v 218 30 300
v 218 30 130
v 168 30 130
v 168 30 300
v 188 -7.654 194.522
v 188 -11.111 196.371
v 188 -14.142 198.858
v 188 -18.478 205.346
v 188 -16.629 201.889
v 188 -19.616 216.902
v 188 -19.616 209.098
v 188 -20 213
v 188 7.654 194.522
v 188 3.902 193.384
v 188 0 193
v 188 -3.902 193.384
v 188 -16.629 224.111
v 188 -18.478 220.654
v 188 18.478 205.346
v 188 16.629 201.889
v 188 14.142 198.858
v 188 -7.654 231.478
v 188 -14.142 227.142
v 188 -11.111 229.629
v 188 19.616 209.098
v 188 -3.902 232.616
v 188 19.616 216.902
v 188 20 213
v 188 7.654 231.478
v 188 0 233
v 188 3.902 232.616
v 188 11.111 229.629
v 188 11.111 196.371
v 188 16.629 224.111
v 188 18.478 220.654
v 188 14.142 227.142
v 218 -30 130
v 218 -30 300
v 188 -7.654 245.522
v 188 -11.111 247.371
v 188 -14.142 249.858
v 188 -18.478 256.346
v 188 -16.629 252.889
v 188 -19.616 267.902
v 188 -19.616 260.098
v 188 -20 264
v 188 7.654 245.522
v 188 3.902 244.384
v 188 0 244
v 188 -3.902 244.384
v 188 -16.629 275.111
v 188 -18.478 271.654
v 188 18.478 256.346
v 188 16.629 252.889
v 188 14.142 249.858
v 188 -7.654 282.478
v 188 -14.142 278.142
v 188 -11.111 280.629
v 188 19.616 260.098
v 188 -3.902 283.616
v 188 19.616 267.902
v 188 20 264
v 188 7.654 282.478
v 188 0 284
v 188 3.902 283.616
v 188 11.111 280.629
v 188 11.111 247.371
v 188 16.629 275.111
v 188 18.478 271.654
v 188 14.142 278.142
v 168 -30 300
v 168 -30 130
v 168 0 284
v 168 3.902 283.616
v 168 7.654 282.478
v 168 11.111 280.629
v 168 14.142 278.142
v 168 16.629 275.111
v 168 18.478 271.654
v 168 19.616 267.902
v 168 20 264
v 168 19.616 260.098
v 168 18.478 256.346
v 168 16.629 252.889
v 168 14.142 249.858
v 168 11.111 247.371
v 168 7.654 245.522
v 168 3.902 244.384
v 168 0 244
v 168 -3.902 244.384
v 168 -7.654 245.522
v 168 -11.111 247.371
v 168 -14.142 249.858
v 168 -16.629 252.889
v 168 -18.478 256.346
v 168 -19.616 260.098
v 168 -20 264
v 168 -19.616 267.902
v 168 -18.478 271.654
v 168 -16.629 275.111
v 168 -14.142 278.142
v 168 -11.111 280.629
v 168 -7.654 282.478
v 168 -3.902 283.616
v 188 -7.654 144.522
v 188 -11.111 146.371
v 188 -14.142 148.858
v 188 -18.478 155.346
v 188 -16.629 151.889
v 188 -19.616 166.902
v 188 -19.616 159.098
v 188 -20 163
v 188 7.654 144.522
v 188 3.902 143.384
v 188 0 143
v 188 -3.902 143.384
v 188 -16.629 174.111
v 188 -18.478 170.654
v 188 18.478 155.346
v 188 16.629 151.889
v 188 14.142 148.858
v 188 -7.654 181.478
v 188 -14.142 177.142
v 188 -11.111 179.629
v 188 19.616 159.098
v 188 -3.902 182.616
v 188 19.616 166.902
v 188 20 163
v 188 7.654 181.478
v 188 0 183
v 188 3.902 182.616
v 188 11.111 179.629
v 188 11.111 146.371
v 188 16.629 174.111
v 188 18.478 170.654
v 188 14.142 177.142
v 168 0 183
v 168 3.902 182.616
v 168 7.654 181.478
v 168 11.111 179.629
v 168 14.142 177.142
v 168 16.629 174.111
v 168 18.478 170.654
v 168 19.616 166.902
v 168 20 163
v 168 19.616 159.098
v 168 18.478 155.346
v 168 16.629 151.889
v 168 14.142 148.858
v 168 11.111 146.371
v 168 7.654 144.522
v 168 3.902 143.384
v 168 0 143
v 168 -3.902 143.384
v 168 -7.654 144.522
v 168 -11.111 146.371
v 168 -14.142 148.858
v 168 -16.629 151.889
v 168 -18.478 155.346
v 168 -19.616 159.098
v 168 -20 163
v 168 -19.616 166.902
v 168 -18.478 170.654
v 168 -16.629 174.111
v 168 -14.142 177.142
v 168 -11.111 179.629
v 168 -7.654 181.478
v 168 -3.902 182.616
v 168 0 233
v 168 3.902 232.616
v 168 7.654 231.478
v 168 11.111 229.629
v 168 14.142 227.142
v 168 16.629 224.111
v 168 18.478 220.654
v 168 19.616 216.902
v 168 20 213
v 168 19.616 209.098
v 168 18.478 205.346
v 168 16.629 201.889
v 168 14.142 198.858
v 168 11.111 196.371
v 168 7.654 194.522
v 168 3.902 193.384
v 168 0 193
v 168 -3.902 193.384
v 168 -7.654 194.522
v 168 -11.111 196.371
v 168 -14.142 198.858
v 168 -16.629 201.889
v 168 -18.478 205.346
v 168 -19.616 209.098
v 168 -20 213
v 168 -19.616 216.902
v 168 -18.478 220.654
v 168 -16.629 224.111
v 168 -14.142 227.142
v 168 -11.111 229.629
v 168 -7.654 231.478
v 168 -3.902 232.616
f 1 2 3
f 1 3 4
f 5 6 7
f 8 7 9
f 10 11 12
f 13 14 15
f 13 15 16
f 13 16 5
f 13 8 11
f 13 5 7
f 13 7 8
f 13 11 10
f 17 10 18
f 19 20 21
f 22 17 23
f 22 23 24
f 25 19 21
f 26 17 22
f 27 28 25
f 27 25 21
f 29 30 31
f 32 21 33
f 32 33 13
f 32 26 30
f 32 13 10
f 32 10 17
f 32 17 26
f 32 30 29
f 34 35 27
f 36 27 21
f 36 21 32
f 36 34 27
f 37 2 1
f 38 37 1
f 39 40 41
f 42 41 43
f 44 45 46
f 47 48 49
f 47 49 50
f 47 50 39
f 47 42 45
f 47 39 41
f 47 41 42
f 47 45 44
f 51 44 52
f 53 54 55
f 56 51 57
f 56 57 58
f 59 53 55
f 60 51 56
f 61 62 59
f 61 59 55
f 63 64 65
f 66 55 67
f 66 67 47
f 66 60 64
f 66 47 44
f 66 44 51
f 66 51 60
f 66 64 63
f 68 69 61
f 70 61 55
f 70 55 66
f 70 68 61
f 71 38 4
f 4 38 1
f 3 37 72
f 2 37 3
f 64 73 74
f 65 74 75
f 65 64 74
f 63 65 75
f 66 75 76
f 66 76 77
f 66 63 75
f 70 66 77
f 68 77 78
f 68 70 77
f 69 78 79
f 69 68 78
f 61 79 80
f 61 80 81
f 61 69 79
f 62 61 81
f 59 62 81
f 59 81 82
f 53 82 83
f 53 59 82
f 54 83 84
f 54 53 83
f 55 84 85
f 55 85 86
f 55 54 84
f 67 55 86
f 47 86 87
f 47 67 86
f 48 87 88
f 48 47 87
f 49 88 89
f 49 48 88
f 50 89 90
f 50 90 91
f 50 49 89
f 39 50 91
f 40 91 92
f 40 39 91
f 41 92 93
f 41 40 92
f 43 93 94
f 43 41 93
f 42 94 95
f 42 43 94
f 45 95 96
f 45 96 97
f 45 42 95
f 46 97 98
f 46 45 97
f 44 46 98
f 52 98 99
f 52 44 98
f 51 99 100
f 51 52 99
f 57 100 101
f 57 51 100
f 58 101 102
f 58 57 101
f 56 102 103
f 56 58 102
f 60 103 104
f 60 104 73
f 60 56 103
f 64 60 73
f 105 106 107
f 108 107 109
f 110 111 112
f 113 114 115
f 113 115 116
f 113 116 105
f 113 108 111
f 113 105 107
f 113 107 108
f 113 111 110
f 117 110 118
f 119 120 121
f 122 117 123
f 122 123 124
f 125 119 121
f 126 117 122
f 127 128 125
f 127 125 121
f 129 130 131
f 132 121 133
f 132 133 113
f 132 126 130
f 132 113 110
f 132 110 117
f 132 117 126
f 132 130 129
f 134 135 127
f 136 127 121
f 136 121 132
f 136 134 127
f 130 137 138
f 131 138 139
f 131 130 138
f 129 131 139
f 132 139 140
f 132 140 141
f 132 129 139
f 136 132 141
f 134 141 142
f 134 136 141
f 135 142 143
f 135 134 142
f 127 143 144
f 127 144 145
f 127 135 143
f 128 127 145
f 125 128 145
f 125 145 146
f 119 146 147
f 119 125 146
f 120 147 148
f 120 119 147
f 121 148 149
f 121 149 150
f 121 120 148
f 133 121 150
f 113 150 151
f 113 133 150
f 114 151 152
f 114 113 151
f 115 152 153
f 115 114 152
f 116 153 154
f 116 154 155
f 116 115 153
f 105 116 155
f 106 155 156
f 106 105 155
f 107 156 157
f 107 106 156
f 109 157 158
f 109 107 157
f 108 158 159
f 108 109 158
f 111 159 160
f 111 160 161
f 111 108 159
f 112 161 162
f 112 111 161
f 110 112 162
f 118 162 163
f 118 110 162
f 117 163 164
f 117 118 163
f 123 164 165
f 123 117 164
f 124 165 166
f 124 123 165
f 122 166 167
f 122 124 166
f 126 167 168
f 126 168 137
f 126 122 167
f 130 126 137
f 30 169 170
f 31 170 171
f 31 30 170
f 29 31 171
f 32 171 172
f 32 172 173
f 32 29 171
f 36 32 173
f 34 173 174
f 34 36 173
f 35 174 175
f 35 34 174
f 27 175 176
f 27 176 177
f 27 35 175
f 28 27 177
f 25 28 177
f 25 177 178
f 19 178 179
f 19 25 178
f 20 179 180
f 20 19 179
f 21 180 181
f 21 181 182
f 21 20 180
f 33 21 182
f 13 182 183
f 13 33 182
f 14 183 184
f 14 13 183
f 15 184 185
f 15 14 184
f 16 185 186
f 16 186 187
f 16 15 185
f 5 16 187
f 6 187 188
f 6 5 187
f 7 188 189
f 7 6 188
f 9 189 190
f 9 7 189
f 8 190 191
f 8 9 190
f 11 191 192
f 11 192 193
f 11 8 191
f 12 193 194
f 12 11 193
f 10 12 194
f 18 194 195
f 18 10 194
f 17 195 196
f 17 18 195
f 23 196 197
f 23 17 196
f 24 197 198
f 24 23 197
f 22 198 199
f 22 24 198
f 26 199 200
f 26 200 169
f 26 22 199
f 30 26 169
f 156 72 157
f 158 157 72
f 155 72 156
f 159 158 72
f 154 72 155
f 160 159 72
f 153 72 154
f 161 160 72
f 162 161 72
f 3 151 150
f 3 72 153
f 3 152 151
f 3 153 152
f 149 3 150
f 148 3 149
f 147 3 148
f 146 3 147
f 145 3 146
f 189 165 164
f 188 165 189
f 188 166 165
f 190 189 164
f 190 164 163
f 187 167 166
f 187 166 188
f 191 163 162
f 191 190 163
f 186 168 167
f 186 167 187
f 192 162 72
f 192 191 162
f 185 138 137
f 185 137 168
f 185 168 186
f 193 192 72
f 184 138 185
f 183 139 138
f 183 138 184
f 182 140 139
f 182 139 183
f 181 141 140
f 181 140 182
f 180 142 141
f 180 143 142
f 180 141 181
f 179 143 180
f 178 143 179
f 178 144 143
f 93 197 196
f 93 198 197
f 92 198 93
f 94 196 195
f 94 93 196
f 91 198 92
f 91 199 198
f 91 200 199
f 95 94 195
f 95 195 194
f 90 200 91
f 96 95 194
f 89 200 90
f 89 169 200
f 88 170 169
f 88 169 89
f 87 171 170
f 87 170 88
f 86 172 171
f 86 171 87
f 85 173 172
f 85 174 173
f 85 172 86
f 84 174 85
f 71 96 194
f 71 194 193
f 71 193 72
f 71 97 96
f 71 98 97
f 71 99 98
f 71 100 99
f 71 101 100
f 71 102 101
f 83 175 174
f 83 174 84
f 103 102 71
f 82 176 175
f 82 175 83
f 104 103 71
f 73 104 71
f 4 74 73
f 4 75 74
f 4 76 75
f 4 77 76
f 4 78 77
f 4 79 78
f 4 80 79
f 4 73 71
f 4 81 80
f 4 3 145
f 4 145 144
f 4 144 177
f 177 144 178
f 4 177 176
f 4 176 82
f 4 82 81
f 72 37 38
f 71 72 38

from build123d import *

# Parameters (mm, degrees)
CYLINDER004_R          = 20
CYLINDER004_DEPTH      = 20
CYLINDER005_R          = 20
CYLINDER005_DEPTH      = 20
CYLINDER003_R          = 20
CYLINDER003_DEPTH      = 20
BOX009_W               = 170
BOX009_H               = 60
BOX009_DEPTH           = 50
CUT006_PLACEMENT_ANGLE = 90


with BuildPart() as cylinder003:
    # Cylinder004 → Cylinder004 (new body)
    with BuildSketch(Plane(origin=(83, 579, 175), x_dir=(1, 0, 0), z_dir=(0, 0, 1))):
        Circle(CYLINDER004_R)
    extrude(amount=CYLINDER004_DEPTH)


with BuildPart() as cylinder004:
    # Cylinder005 → Cylinder005 (new body)
    with BuildSketch(Plane(origin=(134, 579, 175), x_dir=(1, 0, 0), z_dir=(0, 0, 1))):
        Circle(CYLINDER005_R)
    extrude(amount=CYLINDER005_DEPTH)


with BuildPart() as cylinder002:
    # Cylinder003 → Cylinder003 (new body)
    with BuildSketch(Plane(origin=(33, 579, 175), x_dir=(1, 0, 0), z_dir=(0, 0, 1))):
        Circle(CYLINDER003_R)
    extrude(amount=CYLINDER003_DEPTH)


with BuildPart() as prodluzka:
    # Box009 → Box009 (new body)
    with BuildSketch(Plane(origin=(0, 549, 145), x_dir=(1, 0, 0), z_dir=(0, 0, 1))):
        with Locations((85, 30)):
            Rectangle(BOX009_W, BOX009_H)
    extrude(amount=BOX009_DEPTH)

    # Cut004: cut Cylinder002
    add(cylinder002.part, mode=Mode.SUBTRACT)

    # Cut005: cut Cylinder004
    add(cylinder004.part, mode=Mode.SUBTRACT)

    # Cut006: cut Cylinder003
    add(cylinder003.part, mode=Mode.SUBTRACT)


with BuildPart() as prodluzka_1:
    # Cut006 placement: moved
    add(prodluzka.part.moved(Location((363, -579, 130))).rotate(Axis((363, -579, 130), (0, -1, 0)), CUT006_PLACEMENT_ANGLE))


solid = prodluzka_1.part
